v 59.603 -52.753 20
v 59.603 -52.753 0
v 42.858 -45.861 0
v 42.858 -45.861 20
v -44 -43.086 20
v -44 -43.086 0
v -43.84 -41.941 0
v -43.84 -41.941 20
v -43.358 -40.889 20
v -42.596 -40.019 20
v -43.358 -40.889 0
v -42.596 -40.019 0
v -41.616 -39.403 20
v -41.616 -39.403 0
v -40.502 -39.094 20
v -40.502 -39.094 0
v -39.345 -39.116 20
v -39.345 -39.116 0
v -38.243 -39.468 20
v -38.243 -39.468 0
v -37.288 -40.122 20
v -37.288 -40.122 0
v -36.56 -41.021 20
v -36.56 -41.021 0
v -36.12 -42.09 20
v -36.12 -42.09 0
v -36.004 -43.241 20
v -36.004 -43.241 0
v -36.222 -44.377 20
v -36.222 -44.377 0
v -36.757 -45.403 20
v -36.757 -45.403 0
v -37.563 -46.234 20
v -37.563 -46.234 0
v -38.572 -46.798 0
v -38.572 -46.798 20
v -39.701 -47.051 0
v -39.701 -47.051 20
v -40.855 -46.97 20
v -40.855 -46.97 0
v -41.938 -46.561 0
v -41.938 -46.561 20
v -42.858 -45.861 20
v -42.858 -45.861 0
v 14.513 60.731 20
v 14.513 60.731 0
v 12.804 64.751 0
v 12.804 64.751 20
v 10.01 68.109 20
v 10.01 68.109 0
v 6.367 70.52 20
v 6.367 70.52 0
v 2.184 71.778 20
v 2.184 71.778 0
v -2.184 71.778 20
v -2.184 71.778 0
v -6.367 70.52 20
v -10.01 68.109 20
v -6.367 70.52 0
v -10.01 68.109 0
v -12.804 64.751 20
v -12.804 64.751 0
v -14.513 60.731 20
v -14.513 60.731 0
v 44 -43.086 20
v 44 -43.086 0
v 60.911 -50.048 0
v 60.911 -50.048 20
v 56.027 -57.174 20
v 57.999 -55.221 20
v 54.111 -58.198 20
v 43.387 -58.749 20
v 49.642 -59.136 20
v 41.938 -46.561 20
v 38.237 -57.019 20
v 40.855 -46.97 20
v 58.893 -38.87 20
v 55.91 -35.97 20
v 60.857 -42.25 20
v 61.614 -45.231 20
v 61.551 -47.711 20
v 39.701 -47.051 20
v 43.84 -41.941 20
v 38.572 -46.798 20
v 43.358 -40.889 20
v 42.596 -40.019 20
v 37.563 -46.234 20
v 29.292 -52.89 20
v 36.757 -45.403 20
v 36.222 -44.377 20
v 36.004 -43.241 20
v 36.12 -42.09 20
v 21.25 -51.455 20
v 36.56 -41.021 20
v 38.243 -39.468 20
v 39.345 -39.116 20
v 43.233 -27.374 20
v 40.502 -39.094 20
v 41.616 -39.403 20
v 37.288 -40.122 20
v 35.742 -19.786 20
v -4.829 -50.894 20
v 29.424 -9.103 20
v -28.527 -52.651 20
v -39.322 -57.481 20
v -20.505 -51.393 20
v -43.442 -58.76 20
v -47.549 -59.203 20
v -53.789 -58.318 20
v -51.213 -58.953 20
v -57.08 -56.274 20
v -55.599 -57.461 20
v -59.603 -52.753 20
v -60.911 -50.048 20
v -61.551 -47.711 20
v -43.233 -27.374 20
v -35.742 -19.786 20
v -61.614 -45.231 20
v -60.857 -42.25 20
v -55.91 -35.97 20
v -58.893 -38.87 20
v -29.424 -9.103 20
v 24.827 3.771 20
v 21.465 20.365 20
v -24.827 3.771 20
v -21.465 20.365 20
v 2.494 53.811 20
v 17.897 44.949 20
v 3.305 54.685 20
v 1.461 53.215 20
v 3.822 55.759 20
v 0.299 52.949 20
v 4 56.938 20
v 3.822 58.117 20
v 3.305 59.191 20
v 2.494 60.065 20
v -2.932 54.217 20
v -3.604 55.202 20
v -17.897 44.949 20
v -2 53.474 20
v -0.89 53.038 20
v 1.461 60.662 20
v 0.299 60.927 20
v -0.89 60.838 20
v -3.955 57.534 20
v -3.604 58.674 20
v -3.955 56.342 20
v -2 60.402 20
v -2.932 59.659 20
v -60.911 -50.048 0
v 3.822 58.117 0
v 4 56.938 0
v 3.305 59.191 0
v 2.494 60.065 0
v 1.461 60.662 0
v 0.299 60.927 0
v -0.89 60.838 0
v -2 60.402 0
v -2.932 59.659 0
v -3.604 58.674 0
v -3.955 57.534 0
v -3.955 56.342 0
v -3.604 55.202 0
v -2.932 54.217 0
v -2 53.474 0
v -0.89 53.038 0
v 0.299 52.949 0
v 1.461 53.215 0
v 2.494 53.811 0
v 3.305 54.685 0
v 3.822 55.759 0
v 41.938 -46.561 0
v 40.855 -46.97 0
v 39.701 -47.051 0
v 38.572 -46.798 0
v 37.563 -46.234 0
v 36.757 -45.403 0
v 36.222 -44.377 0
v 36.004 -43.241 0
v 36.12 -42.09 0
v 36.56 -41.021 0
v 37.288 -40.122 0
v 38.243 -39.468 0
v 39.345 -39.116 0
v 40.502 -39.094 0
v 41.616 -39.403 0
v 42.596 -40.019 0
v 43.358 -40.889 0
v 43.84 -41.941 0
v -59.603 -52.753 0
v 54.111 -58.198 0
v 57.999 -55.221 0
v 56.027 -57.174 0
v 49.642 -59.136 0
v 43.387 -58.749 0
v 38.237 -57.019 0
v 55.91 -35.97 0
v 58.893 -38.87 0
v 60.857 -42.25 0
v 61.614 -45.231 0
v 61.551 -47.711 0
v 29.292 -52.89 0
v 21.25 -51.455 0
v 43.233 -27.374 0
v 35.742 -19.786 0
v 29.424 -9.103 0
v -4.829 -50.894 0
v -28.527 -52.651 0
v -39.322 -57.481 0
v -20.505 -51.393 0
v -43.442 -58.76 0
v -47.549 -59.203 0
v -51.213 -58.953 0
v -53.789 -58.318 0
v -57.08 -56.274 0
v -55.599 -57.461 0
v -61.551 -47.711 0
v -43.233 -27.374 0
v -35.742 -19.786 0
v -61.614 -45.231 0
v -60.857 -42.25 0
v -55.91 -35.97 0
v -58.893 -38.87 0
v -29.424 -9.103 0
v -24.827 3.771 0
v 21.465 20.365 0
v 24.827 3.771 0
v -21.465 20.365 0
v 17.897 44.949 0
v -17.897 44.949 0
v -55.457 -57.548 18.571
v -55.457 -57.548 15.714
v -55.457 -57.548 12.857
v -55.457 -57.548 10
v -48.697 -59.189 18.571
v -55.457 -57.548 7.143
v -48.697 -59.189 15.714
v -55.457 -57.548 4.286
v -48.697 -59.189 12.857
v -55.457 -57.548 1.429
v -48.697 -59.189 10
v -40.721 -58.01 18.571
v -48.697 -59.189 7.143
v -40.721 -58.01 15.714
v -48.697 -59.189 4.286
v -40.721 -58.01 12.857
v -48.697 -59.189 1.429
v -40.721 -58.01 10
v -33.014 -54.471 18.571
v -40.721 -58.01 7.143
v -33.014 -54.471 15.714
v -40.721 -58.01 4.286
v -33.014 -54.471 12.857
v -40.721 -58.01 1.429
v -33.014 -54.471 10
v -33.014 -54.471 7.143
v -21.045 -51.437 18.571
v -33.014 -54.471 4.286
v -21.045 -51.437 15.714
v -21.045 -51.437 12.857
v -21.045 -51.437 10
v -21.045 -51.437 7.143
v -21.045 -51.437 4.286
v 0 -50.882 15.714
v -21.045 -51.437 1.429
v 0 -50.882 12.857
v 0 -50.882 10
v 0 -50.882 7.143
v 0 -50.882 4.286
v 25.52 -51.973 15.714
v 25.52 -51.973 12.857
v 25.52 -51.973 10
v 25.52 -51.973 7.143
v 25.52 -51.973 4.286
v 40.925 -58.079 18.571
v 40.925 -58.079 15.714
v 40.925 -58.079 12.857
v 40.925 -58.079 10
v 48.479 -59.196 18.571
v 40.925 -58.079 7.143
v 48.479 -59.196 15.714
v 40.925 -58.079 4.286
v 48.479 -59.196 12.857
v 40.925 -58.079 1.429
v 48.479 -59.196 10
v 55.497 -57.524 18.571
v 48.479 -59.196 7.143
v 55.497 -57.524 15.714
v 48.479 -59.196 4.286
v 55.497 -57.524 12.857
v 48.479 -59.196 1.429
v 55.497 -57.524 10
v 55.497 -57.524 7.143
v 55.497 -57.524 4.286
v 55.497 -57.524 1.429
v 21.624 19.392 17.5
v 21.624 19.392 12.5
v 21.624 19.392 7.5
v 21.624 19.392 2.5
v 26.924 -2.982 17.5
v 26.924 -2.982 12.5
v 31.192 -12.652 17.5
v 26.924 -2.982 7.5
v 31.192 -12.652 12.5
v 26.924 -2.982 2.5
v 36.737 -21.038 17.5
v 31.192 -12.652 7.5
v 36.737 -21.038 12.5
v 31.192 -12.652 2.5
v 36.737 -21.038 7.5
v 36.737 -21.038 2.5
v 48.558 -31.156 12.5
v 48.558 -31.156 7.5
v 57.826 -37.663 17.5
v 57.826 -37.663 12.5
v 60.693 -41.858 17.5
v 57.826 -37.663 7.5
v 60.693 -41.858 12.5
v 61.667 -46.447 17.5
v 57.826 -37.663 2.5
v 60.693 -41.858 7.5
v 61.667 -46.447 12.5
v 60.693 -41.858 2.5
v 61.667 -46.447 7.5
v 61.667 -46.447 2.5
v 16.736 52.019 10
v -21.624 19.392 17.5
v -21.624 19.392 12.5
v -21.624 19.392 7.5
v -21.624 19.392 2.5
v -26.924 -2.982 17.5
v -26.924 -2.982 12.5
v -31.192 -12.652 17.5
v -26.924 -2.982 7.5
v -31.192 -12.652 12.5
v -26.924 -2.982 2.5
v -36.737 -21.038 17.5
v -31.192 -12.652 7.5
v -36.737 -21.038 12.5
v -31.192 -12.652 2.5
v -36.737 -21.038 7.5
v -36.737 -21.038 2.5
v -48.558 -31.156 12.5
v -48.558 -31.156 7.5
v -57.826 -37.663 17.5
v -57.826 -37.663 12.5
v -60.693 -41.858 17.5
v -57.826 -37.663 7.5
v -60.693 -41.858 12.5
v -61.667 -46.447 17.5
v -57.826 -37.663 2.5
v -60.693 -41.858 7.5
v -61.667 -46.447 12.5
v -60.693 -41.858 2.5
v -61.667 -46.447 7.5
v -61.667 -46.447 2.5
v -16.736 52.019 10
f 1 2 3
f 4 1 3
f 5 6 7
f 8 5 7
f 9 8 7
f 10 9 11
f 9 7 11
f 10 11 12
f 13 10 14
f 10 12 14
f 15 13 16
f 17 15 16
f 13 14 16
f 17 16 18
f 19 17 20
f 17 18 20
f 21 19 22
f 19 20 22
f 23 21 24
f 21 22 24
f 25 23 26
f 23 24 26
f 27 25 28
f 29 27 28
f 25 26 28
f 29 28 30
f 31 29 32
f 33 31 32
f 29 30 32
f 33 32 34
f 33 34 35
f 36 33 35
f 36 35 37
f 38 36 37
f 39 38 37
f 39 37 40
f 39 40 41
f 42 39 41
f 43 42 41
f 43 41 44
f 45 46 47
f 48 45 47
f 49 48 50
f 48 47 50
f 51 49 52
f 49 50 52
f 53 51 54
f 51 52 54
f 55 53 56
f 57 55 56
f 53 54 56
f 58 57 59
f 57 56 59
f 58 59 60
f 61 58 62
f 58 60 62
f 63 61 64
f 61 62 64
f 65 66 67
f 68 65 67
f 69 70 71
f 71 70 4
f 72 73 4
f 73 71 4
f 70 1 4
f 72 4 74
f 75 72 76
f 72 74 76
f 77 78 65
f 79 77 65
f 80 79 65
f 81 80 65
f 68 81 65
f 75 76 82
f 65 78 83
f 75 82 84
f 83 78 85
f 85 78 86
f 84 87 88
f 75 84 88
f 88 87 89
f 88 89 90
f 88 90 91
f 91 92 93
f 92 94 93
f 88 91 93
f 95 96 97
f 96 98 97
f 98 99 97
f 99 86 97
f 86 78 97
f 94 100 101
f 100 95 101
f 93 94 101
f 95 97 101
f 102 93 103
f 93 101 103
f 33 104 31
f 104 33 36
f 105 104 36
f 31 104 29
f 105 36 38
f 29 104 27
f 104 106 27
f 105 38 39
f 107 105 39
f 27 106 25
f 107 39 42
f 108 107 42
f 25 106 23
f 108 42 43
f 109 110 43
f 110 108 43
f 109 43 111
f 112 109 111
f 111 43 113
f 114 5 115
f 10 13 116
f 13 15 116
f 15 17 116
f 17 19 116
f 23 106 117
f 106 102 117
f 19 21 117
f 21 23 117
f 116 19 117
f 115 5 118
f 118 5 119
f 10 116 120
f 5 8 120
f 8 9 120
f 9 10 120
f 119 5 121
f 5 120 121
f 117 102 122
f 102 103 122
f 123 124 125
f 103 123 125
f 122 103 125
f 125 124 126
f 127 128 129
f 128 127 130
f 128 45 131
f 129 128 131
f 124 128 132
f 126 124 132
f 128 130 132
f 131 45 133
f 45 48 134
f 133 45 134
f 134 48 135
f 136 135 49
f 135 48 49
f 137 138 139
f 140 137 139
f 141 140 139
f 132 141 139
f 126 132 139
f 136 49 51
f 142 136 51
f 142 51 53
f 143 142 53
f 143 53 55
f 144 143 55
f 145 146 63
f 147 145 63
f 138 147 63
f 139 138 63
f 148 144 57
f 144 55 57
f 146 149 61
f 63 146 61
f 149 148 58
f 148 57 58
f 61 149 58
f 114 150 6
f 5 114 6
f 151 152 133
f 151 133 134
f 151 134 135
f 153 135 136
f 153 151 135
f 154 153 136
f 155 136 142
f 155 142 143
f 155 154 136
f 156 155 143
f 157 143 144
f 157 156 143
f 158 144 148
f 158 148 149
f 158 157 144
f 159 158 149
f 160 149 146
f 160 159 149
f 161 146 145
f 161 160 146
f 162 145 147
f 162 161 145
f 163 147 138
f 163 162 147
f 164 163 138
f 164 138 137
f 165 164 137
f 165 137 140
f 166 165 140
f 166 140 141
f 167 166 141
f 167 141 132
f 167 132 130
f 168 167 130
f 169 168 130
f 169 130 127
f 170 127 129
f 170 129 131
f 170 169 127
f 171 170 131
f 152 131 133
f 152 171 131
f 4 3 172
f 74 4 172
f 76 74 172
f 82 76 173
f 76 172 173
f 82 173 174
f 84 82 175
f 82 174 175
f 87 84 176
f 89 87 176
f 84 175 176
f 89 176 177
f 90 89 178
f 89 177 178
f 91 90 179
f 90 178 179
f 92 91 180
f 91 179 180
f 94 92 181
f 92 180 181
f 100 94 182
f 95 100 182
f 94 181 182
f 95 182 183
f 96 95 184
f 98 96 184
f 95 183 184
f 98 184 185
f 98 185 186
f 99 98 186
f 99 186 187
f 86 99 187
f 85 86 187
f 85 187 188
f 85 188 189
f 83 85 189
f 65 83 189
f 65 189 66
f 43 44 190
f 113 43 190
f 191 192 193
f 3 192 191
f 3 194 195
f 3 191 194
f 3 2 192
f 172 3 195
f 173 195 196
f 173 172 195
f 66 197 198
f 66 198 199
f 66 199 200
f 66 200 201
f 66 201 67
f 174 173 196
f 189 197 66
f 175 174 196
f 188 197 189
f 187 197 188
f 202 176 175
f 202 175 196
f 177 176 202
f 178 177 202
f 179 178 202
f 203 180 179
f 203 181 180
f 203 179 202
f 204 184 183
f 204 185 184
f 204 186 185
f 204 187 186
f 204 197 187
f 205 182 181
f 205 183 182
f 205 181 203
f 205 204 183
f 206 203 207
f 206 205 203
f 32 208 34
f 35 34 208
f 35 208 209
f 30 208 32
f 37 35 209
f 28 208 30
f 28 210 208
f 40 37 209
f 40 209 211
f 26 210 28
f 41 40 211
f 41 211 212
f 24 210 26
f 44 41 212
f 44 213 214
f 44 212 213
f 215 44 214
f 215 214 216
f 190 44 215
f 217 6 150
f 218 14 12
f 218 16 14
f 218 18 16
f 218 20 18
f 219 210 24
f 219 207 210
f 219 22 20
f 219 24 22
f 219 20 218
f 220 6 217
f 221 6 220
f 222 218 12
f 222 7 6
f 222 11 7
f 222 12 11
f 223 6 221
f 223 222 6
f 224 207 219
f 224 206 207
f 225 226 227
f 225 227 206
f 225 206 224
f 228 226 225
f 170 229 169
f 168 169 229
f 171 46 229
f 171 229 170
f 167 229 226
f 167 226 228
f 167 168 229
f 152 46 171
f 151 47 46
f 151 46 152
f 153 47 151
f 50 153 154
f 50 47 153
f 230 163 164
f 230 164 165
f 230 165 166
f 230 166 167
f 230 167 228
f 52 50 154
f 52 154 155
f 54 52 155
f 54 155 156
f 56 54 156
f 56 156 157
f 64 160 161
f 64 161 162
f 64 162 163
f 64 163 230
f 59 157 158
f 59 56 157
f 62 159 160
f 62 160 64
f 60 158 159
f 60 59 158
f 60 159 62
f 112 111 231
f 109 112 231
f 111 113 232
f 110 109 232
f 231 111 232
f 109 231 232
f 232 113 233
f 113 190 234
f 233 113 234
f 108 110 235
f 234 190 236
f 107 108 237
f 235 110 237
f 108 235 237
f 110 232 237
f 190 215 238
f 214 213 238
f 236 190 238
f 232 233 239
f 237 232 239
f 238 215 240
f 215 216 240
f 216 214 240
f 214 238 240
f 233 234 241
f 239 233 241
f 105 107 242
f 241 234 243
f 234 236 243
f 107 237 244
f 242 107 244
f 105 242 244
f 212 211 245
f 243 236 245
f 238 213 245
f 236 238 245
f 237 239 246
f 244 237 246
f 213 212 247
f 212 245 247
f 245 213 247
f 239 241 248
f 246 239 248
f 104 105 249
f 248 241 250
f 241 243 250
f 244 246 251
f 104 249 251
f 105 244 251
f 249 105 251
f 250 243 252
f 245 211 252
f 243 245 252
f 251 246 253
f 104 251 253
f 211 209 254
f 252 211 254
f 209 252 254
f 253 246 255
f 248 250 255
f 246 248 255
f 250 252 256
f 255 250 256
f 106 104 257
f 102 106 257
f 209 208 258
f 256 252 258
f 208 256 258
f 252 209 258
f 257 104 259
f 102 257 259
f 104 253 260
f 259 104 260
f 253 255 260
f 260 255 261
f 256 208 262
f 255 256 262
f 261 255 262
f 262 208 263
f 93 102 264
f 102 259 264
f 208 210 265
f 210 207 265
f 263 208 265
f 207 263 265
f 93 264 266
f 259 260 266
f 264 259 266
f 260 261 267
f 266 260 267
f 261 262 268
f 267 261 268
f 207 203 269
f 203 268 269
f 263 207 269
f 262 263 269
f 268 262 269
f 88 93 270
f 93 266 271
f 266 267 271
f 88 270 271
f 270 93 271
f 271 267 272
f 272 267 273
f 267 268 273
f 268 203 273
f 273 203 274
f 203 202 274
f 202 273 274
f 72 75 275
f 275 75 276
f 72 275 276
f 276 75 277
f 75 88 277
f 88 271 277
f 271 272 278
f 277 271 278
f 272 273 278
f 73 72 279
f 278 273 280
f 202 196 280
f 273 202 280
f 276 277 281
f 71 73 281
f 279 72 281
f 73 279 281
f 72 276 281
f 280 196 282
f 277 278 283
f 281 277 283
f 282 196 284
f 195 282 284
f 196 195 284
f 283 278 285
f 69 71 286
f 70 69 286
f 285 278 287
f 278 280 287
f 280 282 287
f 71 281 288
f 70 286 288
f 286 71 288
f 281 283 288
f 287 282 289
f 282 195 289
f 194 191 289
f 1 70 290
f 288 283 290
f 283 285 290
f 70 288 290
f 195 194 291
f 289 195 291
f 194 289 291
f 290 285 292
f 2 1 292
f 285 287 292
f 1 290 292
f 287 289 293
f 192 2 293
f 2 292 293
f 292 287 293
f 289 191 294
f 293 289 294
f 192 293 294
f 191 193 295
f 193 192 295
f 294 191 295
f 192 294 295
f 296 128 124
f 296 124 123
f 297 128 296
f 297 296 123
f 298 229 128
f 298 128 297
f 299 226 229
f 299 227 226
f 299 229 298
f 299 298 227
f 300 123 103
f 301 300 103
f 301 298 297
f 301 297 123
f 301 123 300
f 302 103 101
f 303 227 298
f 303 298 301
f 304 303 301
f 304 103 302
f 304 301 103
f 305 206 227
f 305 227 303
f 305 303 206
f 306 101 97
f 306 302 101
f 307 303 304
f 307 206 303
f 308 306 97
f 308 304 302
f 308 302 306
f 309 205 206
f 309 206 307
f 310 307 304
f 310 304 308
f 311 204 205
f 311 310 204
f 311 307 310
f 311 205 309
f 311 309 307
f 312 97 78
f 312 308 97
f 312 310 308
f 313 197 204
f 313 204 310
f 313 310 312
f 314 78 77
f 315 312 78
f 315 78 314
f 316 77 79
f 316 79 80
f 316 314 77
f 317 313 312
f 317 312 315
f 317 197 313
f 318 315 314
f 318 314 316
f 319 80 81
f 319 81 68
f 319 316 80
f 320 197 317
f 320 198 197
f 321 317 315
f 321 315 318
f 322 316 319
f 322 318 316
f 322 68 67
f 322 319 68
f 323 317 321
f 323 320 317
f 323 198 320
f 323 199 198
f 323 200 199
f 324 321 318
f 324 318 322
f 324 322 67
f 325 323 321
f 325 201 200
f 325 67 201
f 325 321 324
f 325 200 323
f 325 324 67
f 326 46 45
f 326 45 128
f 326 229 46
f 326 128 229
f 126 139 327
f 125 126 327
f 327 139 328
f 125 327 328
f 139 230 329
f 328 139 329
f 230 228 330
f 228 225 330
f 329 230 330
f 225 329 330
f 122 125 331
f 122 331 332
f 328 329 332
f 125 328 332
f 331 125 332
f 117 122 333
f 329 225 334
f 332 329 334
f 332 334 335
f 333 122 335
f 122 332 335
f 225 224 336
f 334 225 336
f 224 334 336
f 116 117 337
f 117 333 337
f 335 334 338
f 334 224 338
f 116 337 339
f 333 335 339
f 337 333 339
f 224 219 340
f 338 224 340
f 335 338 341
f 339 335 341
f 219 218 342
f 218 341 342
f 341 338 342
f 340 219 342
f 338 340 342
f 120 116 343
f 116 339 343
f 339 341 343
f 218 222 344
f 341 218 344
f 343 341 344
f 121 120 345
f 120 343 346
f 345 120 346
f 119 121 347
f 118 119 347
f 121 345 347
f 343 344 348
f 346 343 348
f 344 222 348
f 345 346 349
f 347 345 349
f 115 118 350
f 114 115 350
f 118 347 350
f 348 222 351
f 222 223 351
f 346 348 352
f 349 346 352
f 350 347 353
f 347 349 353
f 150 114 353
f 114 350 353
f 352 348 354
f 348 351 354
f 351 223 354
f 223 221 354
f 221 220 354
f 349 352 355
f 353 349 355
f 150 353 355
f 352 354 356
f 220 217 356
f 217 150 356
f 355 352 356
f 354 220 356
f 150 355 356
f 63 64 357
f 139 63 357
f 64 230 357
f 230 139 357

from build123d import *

# Parameters (mm, degrees)
F0_R     = 4
F1_DEPTH = 20


# Not quite as in the source:
# - a feature names something its author has since deleted; it is built from what else it names


with BuildPart() as f1:
    # F0 (on Top) → F1 (new body)
    with BuildSketch(Plane.XY):
        with BuildLine():
            add(Edge.make_bspline(
                [(14.5126224198, 60.7306027855), (16.8019810413, 52.9729625014), (17.9352869071, 44.6824925706), (21.4682283194, 18.795889632), (25.7689771102, -2.8067896835), (35.5622516207, -21.7126685978), (48.041945088, -31.286667461), (59.0700601288, -37.1336977452), (62.2848892569, -45.05003275), (61.3455249019, -48.9077577206), (60.9110098166, -50.047635349)],
                knots=[0, 0, 0, 0, 0.0835015327, 0.1819072556, 0.277438454, 0.367753358, 0.4463397859, 0.5157798719, 0.5748740106, 0.6017171757, 0.6017171757, 0.6017171757, 0.6017171757], degree=3))
            ThreePointArc((14.5126224198, 60.7306027855), (0, 71.9380059838), (-14.5126224198, 60.7306027855))
            add(Edge.make_bspline(
                [(-14.5126224198, 60.7306027855), (-16.8019810413, 52.9729625014), (-17.9352869071, 44.6824925706), (-21.4682283194, 18.795889632), (-25.7689771102, -2.8067896835), (-35.5622516207, -21.7126685978), (-48.041945088, -31.286667461), (-59.0700601288, -37.1336977452), (-62.2848892569, -45.05003275), (-61.3455249019, -48.9077577206), (-60.9110098166, -50.047635349)],
                knots=[0, 0, 0, 0, 0.0835015327, 0.1819072556, 0.277438454, 0.367753358, 0.4463397859, 0.5157798719, 0.5748740106, 0.6017171757, 0.6017171757, 0.6017171757, 0.6017171757], degree=3))
            Line((-60.9110098166, -50.047635349), (-43.9999255446, -43.0863997004))
            ThreePointArc((-43.9999255446, -43.0863997004), (-36.30112191, -41.5393972621), (-42.8579779791, -45.8605582679))
            Line((-42.8579779791, -45.8605582679), (-59.6026177667, -52.753279133))
            add(Edge.make_bspline(
                [(-59.6026177667, -52.753279133), (-59.5135605178, -52.9091652101), (-58.3731115182, -54.8631475989), (-55.9334692098, -58.202160494), (-48.5097440275, -59.5987131413), (-40.8258914603, -58.598927537), (-32.7700485865, -54.2100123222), (-25.276293749, -51.041569904), (-9.563678396, -50.8815310895), (0, -50.8815310895)],
                knots=[0.6240854269, 0.6240854269, 0.6240854269, 0.6240854269, 0.6281821208, 0.6760341184, 0.7287488094, 0.7845697385, 0.8433145605, 0.8993091345, 1, 1, 1, 1], degree=3))
            add(Edge.make_bspline(
                [(59.6026177667, -52.753279133), (59.5135605178, -52.9091652101), (58.3731115182, -54.8631475989), (55.9334692098, -58.202160494), (48.5097440275, -59.5987131413), (40.8258914603, -58.598927537), (32.7700485865, -54.2100123222), (25.276293749, -51.041569904), (9.563678396, -50.8815310895), (0, -50.8815310895)],
                knots=[0.6240854269, 0.6240854269, 0.6240854269, 0.6240854269, 0.6281821208, 0.6760341184, 0.7287488094, 0.7845697385, 0.8433145605, 0.8993091345, 1, 1, 1, 1], degree=3))
            Line((59.6026177667, -52.753279133), (42.8579779791, -45.8605582679))
            ThreePointArc((42.8579779791, -45.8605582679), (36.30112191, -41.5393972621), (43.9999255446, -43.0863997004))
            Line((43.9999255446, -43.0863997004), (60.9110098166, -50.047635349))
        make_face()
        with Locations((0, 56.9380059838)):
            Circle(F0_R, mode=Mode.SUBTRACT)
    extrude(amount=F1_DEPTH)


solid = f1.part
